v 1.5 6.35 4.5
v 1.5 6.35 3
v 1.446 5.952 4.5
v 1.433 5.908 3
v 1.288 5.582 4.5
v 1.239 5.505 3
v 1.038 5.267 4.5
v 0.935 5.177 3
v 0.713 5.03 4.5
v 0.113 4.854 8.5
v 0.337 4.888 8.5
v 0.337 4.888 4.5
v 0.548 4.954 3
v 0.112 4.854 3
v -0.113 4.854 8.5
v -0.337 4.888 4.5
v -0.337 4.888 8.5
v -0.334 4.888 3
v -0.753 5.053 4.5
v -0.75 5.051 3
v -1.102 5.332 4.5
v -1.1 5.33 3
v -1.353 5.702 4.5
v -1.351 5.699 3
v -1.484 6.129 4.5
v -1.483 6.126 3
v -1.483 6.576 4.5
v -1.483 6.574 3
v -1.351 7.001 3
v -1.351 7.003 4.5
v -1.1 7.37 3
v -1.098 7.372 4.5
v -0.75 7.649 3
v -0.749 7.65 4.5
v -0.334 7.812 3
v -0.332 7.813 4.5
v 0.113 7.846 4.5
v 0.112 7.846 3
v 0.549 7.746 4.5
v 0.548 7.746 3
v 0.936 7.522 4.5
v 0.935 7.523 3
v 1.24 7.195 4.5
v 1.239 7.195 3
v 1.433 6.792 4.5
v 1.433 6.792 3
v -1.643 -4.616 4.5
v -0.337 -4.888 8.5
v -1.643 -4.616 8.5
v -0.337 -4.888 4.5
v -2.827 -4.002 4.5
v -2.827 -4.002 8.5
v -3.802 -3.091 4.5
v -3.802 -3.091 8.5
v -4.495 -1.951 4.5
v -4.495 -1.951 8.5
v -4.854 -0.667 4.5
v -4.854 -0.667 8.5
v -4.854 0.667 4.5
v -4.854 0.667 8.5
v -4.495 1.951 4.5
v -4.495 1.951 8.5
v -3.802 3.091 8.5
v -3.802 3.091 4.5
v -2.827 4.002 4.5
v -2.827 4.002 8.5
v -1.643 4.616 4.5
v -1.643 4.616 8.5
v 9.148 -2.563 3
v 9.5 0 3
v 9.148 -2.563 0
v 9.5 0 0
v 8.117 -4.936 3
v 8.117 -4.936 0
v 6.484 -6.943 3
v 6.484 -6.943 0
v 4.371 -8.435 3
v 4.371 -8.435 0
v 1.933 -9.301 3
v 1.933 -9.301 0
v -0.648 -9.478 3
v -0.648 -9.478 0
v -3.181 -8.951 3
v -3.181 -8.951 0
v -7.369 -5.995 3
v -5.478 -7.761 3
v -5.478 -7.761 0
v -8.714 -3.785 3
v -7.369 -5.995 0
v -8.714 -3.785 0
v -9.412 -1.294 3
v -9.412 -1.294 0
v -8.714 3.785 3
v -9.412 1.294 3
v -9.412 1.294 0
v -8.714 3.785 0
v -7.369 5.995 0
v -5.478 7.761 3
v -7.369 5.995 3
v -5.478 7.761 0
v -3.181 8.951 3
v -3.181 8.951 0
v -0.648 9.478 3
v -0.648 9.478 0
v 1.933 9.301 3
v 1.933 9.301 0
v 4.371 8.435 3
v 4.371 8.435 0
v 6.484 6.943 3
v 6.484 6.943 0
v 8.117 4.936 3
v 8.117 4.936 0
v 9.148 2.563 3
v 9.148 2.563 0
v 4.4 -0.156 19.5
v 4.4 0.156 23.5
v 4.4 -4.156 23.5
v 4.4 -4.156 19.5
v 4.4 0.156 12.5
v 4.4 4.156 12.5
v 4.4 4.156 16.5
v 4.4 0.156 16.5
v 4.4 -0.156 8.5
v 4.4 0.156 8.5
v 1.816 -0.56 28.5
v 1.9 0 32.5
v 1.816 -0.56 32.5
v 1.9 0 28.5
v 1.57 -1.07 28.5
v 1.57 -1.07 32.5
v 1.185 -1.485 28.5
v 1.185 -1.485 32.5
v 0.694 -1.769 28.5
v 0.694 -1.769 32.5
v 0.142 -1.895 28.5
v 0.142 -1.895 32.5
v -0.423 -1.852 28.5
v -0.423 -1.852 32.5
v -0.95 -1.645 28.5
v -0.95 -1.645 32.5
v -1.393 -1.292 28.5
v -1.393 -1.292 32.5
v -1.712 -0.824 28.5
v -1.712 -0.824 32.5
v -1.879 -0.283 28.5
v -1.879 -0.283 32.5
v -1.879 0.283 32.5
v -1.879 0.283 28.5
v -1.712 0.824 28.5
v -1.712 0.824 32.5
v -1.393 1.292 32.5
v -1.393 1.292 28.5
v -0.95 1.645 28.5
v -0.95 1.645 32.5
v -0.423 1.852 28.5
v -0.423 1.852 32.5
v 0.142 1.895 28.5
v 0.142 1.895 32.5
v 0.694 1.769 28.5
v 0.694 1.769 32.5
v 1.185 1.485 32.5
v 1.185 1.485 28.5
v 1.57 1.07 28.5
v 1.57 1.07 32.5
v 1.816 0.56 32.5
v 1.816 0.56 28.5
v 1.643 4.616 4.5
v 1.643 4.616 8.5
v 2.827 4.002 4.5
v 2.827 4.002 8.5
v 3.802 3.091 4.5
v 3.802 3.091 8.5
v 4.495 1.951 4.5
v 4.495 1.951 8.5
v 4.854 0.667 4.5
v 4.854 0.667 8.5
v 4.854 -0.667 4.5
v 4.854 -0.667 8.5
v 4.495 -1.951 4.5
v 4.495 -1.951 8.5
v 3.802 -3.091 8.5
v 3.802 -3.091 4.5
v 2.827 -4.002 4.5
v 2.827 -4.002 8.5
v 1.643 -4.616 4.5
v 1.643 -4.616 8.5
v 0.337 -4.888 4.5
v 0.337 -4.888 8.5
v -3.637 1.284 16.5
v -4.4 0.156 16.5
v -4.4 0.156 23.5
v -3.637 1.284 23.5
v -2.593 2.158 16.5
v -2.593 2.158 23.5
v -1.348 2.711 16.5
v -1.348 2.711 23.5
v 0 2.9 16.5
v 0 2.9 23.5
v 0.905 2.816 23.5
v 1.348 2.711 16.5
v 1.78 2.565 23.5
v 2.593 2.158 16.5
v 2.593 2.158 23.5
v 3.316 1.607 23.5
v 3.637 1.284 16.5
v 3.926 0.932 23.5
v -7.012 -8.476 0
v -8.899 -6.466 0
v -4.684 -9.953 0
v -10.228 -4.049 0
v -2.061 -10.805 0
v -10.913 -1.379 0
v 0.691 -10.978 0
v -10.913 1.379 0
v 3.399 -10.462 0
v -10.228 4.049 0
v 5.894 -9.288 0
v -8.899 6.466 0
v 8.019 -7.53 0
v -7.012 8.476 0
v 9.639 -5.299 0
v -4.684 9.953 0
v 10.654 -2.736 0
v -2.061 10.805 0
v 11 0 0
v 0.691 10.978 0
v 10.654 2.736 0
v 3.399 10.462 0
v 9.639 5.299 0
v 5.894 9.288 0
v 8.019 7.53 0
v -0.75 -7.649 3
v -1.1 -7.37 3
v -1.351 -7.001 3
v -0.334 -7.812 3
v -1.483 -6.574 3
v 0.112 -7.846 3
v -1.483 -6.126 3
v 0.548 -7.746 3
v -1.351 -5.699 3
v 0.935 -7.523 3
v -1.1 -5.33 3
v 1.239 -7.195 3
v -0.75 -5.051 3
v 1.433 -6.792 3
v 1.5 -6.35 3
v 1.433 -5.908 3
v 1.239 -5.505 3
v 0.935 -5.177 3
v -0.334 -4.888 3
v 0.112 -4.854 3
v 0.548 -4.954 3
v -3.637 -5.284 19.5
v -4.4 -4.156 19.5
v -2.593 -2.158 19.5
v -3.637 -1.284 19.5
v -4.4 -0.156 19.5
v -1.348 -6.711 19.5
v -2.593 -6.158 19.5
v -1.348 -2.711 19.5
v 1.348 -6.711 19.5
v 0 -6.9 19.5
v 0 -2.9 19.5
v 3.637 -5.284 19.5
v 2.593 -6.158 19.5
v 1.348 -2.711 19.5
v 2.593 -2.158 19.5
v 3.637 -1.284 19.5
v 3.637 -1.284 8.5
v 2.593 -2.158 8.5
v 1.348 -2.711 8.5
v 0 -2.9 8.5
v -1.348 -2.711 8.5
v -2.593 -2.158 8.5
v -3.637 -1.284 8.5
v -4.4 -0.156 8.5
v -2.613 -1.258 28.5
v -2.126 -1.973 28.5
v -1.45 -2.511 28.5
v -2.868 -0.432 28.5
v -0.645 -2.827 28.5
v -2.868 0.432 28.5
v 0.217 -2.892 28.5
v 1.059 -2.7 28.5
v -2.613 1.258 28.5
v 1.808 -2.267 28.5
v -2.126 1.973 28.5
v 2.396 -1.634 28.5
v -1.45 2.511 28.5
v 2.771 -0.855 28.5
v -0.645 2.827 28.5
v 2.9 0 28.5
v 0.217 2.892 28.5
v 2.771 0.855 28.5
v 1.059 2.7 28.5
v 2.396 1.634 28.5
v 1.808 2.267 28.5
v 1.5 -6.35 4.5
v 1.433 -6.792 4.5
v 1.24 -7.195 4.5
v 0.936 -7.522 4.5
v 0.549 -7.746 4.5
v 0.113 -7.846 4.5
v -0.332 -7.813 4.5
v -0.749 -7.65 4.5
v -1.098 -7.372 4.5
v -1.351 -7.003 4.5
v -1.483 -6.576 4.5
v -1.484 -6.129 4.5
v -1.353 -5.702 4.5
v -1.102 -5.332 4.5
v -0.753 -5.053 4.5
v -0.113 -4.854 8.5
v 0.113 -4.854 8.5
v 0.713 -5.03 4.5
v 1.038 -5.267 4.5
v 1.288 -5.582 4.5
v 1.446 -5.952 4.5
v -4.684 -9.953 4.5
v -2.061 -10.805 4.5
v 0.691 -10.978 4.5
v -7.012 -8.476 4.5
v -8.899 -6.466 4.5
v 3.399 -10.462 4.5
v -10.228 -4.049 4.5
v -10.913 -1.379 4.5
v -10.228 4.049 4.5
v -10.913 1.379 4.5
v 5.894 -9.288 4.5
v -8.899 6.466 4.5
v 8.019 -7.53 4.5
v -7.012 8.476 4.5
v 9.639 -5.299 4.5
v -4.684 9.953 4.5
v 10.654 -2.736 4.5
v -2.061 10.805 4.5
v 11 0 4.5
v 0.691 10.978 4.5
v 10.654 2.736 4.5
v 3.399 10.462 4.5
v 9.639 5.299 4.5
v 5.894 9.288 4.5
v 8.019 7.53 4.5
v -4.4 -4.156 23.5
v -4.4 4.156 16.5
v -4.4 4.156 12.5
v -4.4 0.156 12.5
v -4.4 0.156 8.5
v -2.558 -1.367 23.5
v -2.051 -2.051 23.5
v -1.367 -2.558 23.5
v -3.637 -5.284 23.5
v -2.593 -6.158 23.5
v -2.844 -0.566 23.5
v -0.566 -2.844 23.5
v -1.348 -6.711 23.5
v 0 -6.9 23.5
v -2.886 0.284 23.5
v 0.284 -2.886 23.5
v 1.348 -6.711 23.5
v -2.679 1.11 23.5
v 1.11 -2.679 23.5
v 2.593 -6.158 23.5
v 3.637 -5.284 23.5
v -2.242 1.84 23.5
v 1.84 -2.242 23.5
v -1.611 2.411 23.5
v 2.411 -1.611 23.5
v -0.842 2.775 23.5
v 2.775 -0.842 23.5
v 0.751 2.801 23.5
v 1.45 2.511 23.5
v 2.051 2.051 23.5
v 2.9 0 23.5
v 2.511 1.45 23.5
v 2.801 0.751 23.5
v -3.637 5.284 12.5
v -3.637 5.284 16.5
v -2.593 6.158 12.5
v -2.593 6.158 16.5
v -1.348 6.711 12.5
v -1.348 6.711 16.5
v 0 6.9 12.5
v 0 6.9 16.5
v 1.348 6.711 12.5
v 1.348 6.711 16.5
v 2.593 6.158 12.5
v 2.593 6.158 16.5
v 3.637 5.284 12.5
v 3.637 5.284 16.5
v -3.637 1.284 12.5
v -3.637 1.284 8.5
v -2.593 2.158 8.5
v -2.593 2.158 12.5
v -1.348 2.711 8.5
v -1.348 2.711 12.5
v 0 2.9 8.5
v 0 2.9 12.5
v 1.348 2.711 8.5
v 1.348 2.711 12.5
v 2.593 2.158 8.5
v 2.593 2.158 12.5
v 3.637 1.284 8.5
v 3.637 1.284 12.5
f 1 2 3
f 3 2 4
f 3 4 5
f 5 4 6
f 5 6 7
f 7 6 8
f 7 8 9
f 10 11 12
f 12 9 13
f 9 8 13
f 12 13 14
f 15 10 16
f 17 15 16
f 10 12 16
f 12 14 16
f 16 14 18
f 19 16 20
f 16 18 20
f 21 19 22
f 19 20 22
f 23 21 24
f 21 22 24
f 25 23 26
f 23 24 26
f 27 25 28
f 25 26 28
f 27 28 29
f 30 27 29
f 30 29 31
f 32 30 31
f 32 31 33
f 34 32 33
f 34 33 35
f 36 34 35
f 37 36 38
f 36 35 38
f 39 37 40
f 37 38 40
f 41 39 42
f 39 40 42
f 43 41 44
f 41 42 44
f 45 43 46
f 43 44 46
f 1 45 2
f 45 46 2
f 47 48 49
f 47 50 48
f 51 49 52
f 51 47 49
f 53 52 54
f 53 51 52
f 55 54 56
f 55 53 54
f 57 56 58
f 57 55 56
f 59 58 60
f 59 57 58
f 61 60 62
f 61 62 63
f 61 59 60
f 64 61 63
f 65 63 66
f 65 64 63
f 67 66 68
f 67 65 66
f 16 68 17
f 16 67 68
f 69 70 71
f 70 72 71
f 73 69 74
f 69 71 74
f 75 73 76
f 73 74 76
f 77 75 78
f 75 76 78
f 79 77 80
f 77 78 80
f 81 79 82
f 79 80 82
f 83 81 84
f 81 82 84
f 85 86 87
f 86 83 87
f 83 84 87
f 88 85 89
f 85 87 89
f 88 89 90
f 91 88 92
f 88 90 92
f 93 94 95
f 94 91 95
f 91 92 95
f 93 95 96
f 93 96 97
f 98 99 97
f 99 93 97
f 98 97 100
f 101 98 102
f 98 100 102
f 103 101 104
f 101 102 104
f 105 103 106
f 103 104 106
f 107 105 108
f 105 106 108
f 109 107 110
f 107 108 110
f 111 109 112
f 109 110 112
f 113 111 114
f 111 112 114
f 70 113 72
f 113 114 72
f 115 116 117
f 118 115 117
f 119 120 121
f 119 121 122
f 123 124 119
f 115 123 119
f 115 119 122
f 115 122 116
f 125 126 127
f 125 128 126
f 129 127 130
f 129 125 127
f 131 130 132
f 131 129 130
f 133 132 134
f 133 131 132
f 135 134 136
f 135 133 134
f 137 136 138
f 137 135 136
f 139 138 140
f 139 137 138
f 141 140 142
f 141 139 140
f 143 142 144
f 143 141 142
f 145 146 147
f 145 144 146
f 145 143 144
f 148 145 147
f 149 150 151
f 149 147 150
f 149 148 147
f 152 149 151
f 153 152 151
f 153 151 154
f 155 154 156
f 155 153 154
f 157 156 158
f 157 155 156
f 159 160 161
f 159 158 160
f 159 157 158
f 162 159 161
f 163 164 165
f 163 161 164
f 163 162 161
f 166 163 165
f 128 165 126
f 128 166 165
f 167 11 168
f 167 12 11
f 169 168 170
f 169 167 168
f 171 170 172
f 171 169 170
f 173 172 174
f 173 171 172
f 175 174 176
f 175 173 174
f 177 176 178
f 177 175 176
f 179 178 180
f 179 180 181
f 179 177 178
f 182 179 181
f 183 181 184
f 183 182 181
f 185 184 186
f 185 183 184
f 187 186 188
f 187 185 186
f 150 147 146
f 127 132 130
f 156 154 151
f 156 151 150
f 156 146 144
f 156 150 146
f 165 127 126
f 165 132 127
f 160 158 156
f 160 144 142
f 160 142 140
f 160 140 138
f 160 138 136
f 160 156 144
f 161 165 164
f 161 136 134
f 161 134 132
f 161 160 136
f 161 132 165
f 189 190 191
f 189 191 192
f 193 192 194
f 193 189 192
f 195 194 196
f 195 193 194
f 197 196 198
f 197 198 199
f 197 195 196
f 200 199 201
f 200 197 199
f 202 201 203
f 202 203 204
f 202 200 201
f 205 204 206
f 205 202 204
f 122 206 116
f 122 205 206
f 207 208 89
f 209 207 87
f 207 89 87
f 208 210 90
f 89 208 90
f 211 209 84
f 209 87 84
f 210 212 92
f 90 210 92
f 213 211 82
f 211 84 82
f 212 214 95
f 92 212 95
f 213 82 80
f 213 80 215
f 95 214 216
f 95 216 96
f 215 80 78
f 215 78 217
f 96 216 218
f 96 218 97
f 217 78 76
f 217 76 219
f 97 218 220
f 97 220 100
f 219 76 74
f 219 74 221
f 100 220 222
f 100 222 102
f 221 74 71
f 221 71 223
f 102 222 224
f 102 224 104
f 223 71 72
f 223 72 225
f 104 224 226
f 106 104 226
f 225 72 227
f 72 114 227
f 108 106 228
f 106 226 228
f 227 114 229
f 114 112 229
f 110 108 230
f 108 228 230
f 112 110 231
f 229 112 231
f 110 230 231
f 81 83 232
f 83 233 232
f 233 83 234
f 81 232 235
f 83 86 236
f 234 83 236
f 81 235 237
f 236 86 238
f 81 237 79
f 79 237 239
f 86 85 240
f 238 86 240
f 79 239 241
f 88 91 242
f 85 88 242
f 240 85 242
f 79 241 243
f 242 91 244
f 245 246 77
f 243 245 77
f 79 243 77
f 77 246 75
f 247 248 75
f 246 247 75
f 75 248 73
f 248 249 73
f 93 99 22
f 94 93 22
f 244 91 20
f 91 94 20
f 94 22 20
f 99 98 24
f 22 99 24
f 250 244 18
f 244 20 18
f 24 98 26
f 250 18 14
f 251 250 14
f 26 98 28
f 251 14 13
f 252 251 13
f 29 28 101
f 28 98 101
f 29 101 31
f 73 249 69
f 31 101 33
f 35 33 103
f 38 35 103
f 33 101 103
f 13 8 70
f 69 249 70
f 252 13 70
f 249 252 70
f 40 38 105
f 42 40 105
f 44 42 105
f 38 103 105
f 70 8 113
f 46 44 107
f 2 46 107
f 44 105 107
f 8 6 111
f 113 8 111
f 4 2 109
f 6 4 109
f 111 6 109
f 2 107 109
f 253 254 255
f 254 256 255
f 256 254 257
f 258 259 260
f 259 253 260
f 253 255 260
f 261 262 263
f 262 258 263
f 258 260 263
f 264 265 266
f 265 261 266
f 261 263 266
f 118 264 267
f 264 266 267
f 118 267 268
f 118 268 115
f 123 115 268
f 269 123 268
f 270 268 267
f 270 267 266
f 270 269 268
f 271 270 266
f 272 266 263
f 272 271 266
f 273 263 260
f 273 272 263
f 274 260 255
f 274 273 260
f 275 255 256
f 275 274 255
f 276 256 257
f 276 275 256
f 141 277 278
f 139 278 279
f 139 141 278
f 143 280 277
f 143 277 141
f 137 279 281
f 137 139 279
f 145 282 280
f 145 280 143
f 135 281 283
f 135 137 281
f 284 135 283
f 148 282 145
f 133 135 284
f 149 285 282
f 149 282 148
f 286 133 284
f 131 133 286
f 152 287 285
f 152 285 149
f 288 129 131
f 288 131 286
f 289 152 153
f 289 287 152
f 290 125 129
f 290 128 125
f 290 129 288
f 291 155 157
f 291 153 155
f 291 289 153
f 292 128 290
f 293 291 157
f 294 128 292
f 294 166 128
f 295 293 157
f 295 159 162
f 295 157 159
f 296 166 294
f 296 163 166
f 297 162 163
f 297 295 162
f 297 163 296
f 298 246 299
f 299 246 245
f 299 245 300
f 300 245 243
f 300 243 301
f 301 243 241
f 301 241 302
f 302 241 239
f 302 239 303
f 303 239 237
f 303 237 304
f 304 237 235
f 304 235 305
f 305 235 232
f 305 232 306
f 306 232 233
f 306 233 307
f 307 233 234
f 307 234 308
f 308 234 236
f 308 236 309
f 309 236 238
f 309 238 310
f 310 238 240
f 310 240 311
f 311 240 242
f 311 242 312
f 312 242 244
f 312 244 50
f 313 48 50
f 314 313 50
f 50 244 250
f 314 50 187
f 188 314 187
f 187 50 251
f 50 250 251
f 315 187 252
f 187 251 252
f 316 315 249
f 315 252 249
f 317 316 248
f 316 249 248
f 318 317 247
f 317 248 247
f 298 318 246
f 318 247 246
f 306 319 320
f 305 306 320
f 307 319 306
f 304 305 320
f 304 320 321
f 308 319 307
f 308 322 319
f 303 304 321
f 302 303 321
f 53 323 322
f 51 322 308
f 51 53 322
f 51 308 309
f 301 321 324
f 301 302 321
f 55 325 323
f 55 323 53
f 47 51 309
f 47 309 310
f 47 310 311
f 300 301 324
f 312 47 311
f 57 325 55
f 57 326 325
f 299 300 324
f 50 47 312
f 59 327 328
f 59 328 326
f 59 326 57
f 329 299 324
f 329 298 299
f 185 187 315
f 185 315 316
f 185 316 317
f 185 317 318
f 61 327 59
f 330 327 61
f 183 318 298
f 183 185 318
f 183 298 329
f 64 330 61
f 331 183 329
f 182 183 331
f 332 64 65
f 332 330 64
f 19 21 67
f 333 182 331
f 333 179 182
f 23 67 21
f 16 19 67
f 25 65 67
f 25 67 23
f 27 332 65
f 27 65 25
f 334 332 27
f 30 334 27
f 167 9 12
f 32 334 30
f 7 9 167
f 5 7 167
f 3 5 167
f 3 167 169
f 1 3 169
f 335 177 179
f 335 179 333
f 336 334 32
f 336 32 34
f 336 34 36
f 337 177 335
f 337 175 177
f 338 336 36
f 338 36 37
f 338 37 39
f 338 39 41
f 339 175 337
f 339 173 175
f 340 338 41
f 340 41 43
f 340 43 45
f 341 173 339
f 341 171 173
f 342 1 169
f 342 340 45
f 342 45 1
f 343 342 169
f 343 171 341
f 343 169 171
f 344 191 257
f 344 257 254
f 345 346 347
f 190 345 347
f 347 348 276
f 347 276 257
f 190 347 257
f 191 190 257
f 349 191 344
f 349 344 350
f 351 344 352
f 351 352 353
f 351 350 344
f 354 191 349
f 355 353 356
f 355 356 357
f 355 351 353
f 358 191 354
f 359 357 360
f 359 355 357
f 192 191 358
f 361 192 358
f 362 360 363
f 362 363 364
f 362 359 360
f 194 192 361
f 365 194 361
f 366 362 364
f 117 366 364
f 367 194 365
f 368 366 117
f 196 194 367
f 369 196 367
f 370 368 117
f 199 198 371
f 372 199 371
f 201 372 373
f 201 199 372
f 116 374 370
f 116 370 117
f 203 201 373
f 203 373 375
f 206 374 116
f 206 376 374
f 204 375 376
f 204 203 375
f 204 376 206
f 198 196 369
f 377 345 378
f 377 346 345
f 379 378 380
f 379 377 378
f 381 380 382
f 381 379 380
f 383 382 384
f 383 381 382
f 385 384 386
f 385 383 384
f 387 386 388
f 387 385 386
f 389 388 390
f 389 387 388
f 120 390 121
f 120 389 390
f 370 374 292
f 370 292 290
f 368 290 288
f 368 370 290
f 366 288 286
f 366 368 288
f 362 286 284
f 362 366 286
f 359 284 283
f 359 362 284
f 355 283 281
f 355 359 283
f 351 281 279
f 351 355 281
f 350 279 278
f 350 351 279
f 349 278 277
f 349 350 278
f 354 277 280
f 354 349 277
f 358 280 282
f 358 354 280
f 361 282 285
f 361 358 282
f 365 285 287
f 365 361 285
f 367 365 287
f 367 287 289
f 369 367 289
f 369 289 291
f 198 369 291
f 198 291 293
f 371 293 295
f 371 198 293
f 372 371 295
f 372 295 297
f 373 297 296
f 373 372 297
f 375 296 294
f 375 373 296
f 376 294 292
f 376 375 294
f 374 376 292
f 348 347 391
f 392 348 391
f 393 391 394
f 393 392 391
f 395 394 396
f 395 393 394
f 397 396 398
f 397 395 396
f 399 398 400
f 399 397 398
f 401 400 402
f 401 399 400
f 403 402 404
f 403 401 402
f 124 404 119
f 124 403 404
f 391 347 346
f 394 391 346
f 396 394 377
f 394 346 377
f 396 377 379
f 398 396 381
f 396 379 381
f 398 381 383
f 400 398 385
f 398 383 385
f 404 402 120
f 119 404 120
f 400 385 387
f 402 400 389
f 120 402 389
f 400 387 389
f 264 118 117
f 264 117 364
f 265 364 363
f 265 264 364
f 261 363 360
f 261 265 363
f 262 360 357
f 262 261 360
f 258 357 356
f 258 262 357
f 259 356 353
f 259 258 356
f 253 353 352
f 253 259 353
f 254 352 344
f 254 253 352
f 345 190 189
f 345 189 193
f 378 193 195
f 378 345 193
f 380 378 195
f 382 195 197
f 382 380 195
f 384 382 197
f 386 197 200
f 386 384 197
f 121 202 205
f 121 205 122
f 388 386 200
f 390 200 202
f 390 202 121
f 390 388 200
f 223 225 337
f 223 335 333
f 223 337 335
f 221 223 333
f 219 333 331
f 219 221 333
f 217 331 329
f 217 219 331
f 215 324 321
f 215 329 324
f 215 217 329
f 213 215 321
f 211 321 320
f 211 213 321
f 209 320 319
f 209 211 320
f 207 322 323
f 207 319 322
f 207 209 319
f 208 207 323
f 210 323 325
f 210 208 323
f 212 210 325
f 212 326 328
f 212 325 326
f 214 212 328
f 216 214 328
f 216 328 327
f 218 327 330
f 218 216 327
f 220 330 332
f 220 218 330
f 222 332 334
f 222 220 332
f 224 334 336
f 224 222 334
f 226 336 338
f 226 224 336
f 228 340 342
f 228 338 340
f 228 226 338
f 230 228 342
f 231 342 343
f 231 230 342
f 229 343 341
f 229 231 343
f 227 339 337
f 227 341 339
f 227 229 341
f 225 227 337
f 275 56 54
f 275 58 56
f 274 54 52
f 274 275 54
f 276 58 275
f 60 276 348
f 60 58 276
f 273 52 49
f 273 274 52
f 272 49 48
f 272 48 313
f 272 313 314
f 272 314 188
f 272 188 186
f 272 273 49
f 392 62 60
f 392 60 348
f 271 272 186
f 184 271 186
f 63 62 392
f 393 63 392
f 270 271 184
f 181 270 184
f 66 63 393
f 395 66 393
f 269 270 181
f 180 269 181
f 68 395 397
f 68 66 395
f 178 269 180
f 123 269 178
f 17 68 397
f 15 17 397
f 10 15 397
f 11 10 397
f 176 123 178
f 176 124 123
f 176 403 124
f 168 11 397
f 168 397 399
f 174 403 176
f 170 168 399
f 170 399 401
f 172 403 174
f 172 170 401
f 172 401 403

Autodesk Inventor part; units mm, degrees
ref_plane "YZ Plane" through (0, 0, 0) normal (1, 0, 0) x (0, 1, 0)
ref_plane "XZ Plane" through (0, 0, 0) normal (0, 1, 0) x (-1, 0, 0)
ref_plane "XY Plane" through (0, 0, 0) normal (0, 0, 1) x (1, 0, 0)
sketch "Skizze1" plane through (0, 0, 0) normal (0, 0, 1) x (1, 0, 0)
  line L0 (0, 15.4) -> (0, -15.4) construction
  line L1 (-15.4, 0) -> (15.4, 0) construction
  circle A0 centre (0, 0) radius 1.9
  arc A1 (-4.4, -4.1564) -> (4.4, -4.1564) centre (0, -2) ccw
  line L2 (0, 2) -> (0, 0) construction
  line L3 (0, 0) -> (2, 0) construction
  arc A2 (-4.4, -0.1564) -> (4.4, -0.1564) centre (0, 2) ccw
  arc A3 (4.4, 0.1564) -> (-4.4, 0.1564) centre (0, -2) ccw
  line L4 (0, 0) -> (0, -2) construction
  circle A4 centre (0, 0) radius 9.5
  circle A5 centre (0, 0) radius 11
  circle A6 centre (0, 0) radius 6.35 construction
  circle A7 centre (0, -6.35) radius 1.5
  circle A8 centre (0, 6.35) radius 1.5
  line L5 (0, -6.35) -> (0, 0) construction
  line L6 (0, 0) -> (-6.35, 0) construction
  line L7 (4.4, 4.1564) -> (4.4, -4.1564)
  line L8 (-4.4, 4.1564) -> (-4.4, -4.1564)
  line L9 (4.9, 2) -> (4.9, -2) construction
  arc A9 (4.4, 4.1564) -> (-4.4, 4.1564) centre (0, 2) ccw
  arc A10 (4.4, -0.1564) -> (4.4, 4.1564) centre (0, 2) ccw construction
  arc A11 (4.4, -4.1564) -> (4.4, 0.1564) centre (0, -2) ccw construction
  arc A12 (-4.4, 4.1564) -> (-4.4, -0.1564) centre (0, 2) ccw construction
  arc A13 (-4.4, 0.1564) -> (-4.4, -4.1564) centre (0, -2) ccw construction
  line L10 (-4.9, 2) -> (-4.9, -2) construction
  circle A14 centre (0, 0) radius 2.9
  circle A15 centre (0, 2) radius 5.9
  circle A16 centre (0, -6.35) radius 2.5
  circle A17 centre (0, 6.35) radius 2.5
  circle A18 centre (0, -2) radius 5.9
  circle A19 centre (0, 0) radius 4.9
  dimension "d0" = 3.8
  dimension "d1" = 2
  dimension "d14" = 2
  dimension "d15" = 180
  dimension "d16" = 9.5
  dimension "d17" = 1.5
  dimension "d20" = 6.35
  dimension "d21" = 3
  dimension "d26" = 0.5
  dimension "d27" = 0.5
  dimension "d28" = 4.9
  dimension "d31" = 1
  dimension "d34" = 1
  dimension "d37" = 1
  dimension "d40" = 1
extrude "Extrusion6" add sketch "Skizze1" along normal blind 3 contours A5
extrude "Extrusion7" add sketch "Skizze1" along normal blind 1.5 from surface at 3 contours A0 | L8 A19 A16 A1 | A1 A16 A18 A15 A19 L8 | A16 A19 A7 A1 | A1 A7 A16 A18 | A19 A15 L8 | L8 A15 A16 A19 | A7 A19 A1 | A1 A7 | A16 A15 A19 A7 | A18 A16 | A15 A19 A18 L8 | L8 A2 L7 A15 A16 | A15 A18 A19 | A7 A19 A16 A1 | A7 A19 | A16 A15 | A16 A1 L7 A19 A15 A18 | A15 A17 A9 L8 A19 A18 | L8 A3 A14 A2 | A19 L8 A18 | A16 A19 L7 A1 | A15 L7 A19 A16 | A17 A15 | A15 A17 A9 A8 | A14 A3 L7 A2 | A14 | L8 A18 A17 L7 A3 | L8 A19 A17 A18 | L8 A9 A17 A19 | A15 A19 L7 | L7 A18 A19 A15 | A18 A19 L7 A9 A17 A15 | A15 A19 A18 | A9 A8 A19 A17 | A18 A17 | A17 A19 A8 A18 | A18 L7 A19 | A9 A8 A19 | A8 A9 | A17 A19 L7 A18 | A19 A8 | A19 A17 A9 L7 | A17 A19 A8 A9 | A4 | A5
extrude "Extrusion15" add sketch "Skizze1" along normal blind 4 from surface at 4.5 contours A0 | A19 A15 L8 | L8 A15 A16 A19 | A16 A15 A19 A7 | A15 A19 A18 L8 | L8 A2 L7 A15 A16 | A7 A19 | A16 A15 | L8 A3 A14 A2 | A19 L8 A18 | A15 L7 A19 A16 | A14 A3 L7 A2 | A14 | L8 A18 A17 L7 A3 | L8 A19 A17 A18 | A15 A19 L7 | L7 A18 A19 A15 | A18 A17 | A17 A19 A8 A18 | A18 L7 A19 | A17 A19 L7 A18 | A19 A8
extrude "Extrusion8" cut sketch "Skizze1" along normal through all both and the other way through all contours A7 A19 A1 | A1 A7 | A7 A19 | A9 A8 A19 | A8 A9 | A19 A8
extrude "Extrusion16" add sketch "Skizze1" along normal blind 4 from surface at 8.5 contours A0 | L8 A3 A14 A2 | A14 A3 L7 A2 | A14
extrude "Extrusion12" cut sketch "Skizze1" along normal blind 3 from surface at 12.5 contours A16 A19 A7 A1 | A1 A7 A16 A18 | A16 A15 A19 A7 | A18 A16 | A7 A19 A16 A1 | A16 A15 | A17 A15 | A15 A17 A9 A8 | A9 A8 A19 A17 | A18 A17 | A17 A19 A8 A18 | A9 A8 A19 | A8 A9 | A19 A8 | A17 A19 A8 A9
extrude "Extrusion2" add sketch "Skizze1" along normal blind 4 from surface at 12.5 contours A0 | L8 A3 A14 A2 | A14 A3 L7 A2 | A14 | L8 A18 A17 L7 A3 | L8 A19 A17 A18 | L8 A9 A17 A19 | A9 A8 A19 A17 | A18 A17 | A17 A19 A8 A18 | A9 A8 A19 | A17 A19 L7 A18 | A19 A8 | A19 A17 A9 L7 | A17 A19 A8 A9
extrude "Extrusion3" add sketch "Skizze1" along normal blind 3 from surface at 16.5 contours A0 | L8 A3 A14 A2 | A14 A3 L7 A2 | A14
extrude "Extrusion4" add sketch "Skizze1" along normal blind 4 from surface at 19.5 contours A0 | L8 A19 A16 A1 | A16 A19 A7 A1 | L8 A15 A16 A19 | A7 A19 A1 | A16 A15 A19 A7 | L8 A2 L7 A15 A16 | A7 A19 A16 A1 | A7 A19 | A16 A15 | L8 A3 A14 A2 | A16 A19 L7 A1 | A15 L7 A19 A16 | A14 A3 L7 A2 | A14
extrude "Extrusion10" add sketch "Skizze1" along normal blind 5 from surface at 23.5 contours A0 | A14
extrude "Extrusion14" add sketch "Skizze1" along normal blind 4 from surface at 28.5 contours A0
equation "\"d14\" = d1"
equation "\"d27\" = d26"
properties part number "ExcentricShaft"
